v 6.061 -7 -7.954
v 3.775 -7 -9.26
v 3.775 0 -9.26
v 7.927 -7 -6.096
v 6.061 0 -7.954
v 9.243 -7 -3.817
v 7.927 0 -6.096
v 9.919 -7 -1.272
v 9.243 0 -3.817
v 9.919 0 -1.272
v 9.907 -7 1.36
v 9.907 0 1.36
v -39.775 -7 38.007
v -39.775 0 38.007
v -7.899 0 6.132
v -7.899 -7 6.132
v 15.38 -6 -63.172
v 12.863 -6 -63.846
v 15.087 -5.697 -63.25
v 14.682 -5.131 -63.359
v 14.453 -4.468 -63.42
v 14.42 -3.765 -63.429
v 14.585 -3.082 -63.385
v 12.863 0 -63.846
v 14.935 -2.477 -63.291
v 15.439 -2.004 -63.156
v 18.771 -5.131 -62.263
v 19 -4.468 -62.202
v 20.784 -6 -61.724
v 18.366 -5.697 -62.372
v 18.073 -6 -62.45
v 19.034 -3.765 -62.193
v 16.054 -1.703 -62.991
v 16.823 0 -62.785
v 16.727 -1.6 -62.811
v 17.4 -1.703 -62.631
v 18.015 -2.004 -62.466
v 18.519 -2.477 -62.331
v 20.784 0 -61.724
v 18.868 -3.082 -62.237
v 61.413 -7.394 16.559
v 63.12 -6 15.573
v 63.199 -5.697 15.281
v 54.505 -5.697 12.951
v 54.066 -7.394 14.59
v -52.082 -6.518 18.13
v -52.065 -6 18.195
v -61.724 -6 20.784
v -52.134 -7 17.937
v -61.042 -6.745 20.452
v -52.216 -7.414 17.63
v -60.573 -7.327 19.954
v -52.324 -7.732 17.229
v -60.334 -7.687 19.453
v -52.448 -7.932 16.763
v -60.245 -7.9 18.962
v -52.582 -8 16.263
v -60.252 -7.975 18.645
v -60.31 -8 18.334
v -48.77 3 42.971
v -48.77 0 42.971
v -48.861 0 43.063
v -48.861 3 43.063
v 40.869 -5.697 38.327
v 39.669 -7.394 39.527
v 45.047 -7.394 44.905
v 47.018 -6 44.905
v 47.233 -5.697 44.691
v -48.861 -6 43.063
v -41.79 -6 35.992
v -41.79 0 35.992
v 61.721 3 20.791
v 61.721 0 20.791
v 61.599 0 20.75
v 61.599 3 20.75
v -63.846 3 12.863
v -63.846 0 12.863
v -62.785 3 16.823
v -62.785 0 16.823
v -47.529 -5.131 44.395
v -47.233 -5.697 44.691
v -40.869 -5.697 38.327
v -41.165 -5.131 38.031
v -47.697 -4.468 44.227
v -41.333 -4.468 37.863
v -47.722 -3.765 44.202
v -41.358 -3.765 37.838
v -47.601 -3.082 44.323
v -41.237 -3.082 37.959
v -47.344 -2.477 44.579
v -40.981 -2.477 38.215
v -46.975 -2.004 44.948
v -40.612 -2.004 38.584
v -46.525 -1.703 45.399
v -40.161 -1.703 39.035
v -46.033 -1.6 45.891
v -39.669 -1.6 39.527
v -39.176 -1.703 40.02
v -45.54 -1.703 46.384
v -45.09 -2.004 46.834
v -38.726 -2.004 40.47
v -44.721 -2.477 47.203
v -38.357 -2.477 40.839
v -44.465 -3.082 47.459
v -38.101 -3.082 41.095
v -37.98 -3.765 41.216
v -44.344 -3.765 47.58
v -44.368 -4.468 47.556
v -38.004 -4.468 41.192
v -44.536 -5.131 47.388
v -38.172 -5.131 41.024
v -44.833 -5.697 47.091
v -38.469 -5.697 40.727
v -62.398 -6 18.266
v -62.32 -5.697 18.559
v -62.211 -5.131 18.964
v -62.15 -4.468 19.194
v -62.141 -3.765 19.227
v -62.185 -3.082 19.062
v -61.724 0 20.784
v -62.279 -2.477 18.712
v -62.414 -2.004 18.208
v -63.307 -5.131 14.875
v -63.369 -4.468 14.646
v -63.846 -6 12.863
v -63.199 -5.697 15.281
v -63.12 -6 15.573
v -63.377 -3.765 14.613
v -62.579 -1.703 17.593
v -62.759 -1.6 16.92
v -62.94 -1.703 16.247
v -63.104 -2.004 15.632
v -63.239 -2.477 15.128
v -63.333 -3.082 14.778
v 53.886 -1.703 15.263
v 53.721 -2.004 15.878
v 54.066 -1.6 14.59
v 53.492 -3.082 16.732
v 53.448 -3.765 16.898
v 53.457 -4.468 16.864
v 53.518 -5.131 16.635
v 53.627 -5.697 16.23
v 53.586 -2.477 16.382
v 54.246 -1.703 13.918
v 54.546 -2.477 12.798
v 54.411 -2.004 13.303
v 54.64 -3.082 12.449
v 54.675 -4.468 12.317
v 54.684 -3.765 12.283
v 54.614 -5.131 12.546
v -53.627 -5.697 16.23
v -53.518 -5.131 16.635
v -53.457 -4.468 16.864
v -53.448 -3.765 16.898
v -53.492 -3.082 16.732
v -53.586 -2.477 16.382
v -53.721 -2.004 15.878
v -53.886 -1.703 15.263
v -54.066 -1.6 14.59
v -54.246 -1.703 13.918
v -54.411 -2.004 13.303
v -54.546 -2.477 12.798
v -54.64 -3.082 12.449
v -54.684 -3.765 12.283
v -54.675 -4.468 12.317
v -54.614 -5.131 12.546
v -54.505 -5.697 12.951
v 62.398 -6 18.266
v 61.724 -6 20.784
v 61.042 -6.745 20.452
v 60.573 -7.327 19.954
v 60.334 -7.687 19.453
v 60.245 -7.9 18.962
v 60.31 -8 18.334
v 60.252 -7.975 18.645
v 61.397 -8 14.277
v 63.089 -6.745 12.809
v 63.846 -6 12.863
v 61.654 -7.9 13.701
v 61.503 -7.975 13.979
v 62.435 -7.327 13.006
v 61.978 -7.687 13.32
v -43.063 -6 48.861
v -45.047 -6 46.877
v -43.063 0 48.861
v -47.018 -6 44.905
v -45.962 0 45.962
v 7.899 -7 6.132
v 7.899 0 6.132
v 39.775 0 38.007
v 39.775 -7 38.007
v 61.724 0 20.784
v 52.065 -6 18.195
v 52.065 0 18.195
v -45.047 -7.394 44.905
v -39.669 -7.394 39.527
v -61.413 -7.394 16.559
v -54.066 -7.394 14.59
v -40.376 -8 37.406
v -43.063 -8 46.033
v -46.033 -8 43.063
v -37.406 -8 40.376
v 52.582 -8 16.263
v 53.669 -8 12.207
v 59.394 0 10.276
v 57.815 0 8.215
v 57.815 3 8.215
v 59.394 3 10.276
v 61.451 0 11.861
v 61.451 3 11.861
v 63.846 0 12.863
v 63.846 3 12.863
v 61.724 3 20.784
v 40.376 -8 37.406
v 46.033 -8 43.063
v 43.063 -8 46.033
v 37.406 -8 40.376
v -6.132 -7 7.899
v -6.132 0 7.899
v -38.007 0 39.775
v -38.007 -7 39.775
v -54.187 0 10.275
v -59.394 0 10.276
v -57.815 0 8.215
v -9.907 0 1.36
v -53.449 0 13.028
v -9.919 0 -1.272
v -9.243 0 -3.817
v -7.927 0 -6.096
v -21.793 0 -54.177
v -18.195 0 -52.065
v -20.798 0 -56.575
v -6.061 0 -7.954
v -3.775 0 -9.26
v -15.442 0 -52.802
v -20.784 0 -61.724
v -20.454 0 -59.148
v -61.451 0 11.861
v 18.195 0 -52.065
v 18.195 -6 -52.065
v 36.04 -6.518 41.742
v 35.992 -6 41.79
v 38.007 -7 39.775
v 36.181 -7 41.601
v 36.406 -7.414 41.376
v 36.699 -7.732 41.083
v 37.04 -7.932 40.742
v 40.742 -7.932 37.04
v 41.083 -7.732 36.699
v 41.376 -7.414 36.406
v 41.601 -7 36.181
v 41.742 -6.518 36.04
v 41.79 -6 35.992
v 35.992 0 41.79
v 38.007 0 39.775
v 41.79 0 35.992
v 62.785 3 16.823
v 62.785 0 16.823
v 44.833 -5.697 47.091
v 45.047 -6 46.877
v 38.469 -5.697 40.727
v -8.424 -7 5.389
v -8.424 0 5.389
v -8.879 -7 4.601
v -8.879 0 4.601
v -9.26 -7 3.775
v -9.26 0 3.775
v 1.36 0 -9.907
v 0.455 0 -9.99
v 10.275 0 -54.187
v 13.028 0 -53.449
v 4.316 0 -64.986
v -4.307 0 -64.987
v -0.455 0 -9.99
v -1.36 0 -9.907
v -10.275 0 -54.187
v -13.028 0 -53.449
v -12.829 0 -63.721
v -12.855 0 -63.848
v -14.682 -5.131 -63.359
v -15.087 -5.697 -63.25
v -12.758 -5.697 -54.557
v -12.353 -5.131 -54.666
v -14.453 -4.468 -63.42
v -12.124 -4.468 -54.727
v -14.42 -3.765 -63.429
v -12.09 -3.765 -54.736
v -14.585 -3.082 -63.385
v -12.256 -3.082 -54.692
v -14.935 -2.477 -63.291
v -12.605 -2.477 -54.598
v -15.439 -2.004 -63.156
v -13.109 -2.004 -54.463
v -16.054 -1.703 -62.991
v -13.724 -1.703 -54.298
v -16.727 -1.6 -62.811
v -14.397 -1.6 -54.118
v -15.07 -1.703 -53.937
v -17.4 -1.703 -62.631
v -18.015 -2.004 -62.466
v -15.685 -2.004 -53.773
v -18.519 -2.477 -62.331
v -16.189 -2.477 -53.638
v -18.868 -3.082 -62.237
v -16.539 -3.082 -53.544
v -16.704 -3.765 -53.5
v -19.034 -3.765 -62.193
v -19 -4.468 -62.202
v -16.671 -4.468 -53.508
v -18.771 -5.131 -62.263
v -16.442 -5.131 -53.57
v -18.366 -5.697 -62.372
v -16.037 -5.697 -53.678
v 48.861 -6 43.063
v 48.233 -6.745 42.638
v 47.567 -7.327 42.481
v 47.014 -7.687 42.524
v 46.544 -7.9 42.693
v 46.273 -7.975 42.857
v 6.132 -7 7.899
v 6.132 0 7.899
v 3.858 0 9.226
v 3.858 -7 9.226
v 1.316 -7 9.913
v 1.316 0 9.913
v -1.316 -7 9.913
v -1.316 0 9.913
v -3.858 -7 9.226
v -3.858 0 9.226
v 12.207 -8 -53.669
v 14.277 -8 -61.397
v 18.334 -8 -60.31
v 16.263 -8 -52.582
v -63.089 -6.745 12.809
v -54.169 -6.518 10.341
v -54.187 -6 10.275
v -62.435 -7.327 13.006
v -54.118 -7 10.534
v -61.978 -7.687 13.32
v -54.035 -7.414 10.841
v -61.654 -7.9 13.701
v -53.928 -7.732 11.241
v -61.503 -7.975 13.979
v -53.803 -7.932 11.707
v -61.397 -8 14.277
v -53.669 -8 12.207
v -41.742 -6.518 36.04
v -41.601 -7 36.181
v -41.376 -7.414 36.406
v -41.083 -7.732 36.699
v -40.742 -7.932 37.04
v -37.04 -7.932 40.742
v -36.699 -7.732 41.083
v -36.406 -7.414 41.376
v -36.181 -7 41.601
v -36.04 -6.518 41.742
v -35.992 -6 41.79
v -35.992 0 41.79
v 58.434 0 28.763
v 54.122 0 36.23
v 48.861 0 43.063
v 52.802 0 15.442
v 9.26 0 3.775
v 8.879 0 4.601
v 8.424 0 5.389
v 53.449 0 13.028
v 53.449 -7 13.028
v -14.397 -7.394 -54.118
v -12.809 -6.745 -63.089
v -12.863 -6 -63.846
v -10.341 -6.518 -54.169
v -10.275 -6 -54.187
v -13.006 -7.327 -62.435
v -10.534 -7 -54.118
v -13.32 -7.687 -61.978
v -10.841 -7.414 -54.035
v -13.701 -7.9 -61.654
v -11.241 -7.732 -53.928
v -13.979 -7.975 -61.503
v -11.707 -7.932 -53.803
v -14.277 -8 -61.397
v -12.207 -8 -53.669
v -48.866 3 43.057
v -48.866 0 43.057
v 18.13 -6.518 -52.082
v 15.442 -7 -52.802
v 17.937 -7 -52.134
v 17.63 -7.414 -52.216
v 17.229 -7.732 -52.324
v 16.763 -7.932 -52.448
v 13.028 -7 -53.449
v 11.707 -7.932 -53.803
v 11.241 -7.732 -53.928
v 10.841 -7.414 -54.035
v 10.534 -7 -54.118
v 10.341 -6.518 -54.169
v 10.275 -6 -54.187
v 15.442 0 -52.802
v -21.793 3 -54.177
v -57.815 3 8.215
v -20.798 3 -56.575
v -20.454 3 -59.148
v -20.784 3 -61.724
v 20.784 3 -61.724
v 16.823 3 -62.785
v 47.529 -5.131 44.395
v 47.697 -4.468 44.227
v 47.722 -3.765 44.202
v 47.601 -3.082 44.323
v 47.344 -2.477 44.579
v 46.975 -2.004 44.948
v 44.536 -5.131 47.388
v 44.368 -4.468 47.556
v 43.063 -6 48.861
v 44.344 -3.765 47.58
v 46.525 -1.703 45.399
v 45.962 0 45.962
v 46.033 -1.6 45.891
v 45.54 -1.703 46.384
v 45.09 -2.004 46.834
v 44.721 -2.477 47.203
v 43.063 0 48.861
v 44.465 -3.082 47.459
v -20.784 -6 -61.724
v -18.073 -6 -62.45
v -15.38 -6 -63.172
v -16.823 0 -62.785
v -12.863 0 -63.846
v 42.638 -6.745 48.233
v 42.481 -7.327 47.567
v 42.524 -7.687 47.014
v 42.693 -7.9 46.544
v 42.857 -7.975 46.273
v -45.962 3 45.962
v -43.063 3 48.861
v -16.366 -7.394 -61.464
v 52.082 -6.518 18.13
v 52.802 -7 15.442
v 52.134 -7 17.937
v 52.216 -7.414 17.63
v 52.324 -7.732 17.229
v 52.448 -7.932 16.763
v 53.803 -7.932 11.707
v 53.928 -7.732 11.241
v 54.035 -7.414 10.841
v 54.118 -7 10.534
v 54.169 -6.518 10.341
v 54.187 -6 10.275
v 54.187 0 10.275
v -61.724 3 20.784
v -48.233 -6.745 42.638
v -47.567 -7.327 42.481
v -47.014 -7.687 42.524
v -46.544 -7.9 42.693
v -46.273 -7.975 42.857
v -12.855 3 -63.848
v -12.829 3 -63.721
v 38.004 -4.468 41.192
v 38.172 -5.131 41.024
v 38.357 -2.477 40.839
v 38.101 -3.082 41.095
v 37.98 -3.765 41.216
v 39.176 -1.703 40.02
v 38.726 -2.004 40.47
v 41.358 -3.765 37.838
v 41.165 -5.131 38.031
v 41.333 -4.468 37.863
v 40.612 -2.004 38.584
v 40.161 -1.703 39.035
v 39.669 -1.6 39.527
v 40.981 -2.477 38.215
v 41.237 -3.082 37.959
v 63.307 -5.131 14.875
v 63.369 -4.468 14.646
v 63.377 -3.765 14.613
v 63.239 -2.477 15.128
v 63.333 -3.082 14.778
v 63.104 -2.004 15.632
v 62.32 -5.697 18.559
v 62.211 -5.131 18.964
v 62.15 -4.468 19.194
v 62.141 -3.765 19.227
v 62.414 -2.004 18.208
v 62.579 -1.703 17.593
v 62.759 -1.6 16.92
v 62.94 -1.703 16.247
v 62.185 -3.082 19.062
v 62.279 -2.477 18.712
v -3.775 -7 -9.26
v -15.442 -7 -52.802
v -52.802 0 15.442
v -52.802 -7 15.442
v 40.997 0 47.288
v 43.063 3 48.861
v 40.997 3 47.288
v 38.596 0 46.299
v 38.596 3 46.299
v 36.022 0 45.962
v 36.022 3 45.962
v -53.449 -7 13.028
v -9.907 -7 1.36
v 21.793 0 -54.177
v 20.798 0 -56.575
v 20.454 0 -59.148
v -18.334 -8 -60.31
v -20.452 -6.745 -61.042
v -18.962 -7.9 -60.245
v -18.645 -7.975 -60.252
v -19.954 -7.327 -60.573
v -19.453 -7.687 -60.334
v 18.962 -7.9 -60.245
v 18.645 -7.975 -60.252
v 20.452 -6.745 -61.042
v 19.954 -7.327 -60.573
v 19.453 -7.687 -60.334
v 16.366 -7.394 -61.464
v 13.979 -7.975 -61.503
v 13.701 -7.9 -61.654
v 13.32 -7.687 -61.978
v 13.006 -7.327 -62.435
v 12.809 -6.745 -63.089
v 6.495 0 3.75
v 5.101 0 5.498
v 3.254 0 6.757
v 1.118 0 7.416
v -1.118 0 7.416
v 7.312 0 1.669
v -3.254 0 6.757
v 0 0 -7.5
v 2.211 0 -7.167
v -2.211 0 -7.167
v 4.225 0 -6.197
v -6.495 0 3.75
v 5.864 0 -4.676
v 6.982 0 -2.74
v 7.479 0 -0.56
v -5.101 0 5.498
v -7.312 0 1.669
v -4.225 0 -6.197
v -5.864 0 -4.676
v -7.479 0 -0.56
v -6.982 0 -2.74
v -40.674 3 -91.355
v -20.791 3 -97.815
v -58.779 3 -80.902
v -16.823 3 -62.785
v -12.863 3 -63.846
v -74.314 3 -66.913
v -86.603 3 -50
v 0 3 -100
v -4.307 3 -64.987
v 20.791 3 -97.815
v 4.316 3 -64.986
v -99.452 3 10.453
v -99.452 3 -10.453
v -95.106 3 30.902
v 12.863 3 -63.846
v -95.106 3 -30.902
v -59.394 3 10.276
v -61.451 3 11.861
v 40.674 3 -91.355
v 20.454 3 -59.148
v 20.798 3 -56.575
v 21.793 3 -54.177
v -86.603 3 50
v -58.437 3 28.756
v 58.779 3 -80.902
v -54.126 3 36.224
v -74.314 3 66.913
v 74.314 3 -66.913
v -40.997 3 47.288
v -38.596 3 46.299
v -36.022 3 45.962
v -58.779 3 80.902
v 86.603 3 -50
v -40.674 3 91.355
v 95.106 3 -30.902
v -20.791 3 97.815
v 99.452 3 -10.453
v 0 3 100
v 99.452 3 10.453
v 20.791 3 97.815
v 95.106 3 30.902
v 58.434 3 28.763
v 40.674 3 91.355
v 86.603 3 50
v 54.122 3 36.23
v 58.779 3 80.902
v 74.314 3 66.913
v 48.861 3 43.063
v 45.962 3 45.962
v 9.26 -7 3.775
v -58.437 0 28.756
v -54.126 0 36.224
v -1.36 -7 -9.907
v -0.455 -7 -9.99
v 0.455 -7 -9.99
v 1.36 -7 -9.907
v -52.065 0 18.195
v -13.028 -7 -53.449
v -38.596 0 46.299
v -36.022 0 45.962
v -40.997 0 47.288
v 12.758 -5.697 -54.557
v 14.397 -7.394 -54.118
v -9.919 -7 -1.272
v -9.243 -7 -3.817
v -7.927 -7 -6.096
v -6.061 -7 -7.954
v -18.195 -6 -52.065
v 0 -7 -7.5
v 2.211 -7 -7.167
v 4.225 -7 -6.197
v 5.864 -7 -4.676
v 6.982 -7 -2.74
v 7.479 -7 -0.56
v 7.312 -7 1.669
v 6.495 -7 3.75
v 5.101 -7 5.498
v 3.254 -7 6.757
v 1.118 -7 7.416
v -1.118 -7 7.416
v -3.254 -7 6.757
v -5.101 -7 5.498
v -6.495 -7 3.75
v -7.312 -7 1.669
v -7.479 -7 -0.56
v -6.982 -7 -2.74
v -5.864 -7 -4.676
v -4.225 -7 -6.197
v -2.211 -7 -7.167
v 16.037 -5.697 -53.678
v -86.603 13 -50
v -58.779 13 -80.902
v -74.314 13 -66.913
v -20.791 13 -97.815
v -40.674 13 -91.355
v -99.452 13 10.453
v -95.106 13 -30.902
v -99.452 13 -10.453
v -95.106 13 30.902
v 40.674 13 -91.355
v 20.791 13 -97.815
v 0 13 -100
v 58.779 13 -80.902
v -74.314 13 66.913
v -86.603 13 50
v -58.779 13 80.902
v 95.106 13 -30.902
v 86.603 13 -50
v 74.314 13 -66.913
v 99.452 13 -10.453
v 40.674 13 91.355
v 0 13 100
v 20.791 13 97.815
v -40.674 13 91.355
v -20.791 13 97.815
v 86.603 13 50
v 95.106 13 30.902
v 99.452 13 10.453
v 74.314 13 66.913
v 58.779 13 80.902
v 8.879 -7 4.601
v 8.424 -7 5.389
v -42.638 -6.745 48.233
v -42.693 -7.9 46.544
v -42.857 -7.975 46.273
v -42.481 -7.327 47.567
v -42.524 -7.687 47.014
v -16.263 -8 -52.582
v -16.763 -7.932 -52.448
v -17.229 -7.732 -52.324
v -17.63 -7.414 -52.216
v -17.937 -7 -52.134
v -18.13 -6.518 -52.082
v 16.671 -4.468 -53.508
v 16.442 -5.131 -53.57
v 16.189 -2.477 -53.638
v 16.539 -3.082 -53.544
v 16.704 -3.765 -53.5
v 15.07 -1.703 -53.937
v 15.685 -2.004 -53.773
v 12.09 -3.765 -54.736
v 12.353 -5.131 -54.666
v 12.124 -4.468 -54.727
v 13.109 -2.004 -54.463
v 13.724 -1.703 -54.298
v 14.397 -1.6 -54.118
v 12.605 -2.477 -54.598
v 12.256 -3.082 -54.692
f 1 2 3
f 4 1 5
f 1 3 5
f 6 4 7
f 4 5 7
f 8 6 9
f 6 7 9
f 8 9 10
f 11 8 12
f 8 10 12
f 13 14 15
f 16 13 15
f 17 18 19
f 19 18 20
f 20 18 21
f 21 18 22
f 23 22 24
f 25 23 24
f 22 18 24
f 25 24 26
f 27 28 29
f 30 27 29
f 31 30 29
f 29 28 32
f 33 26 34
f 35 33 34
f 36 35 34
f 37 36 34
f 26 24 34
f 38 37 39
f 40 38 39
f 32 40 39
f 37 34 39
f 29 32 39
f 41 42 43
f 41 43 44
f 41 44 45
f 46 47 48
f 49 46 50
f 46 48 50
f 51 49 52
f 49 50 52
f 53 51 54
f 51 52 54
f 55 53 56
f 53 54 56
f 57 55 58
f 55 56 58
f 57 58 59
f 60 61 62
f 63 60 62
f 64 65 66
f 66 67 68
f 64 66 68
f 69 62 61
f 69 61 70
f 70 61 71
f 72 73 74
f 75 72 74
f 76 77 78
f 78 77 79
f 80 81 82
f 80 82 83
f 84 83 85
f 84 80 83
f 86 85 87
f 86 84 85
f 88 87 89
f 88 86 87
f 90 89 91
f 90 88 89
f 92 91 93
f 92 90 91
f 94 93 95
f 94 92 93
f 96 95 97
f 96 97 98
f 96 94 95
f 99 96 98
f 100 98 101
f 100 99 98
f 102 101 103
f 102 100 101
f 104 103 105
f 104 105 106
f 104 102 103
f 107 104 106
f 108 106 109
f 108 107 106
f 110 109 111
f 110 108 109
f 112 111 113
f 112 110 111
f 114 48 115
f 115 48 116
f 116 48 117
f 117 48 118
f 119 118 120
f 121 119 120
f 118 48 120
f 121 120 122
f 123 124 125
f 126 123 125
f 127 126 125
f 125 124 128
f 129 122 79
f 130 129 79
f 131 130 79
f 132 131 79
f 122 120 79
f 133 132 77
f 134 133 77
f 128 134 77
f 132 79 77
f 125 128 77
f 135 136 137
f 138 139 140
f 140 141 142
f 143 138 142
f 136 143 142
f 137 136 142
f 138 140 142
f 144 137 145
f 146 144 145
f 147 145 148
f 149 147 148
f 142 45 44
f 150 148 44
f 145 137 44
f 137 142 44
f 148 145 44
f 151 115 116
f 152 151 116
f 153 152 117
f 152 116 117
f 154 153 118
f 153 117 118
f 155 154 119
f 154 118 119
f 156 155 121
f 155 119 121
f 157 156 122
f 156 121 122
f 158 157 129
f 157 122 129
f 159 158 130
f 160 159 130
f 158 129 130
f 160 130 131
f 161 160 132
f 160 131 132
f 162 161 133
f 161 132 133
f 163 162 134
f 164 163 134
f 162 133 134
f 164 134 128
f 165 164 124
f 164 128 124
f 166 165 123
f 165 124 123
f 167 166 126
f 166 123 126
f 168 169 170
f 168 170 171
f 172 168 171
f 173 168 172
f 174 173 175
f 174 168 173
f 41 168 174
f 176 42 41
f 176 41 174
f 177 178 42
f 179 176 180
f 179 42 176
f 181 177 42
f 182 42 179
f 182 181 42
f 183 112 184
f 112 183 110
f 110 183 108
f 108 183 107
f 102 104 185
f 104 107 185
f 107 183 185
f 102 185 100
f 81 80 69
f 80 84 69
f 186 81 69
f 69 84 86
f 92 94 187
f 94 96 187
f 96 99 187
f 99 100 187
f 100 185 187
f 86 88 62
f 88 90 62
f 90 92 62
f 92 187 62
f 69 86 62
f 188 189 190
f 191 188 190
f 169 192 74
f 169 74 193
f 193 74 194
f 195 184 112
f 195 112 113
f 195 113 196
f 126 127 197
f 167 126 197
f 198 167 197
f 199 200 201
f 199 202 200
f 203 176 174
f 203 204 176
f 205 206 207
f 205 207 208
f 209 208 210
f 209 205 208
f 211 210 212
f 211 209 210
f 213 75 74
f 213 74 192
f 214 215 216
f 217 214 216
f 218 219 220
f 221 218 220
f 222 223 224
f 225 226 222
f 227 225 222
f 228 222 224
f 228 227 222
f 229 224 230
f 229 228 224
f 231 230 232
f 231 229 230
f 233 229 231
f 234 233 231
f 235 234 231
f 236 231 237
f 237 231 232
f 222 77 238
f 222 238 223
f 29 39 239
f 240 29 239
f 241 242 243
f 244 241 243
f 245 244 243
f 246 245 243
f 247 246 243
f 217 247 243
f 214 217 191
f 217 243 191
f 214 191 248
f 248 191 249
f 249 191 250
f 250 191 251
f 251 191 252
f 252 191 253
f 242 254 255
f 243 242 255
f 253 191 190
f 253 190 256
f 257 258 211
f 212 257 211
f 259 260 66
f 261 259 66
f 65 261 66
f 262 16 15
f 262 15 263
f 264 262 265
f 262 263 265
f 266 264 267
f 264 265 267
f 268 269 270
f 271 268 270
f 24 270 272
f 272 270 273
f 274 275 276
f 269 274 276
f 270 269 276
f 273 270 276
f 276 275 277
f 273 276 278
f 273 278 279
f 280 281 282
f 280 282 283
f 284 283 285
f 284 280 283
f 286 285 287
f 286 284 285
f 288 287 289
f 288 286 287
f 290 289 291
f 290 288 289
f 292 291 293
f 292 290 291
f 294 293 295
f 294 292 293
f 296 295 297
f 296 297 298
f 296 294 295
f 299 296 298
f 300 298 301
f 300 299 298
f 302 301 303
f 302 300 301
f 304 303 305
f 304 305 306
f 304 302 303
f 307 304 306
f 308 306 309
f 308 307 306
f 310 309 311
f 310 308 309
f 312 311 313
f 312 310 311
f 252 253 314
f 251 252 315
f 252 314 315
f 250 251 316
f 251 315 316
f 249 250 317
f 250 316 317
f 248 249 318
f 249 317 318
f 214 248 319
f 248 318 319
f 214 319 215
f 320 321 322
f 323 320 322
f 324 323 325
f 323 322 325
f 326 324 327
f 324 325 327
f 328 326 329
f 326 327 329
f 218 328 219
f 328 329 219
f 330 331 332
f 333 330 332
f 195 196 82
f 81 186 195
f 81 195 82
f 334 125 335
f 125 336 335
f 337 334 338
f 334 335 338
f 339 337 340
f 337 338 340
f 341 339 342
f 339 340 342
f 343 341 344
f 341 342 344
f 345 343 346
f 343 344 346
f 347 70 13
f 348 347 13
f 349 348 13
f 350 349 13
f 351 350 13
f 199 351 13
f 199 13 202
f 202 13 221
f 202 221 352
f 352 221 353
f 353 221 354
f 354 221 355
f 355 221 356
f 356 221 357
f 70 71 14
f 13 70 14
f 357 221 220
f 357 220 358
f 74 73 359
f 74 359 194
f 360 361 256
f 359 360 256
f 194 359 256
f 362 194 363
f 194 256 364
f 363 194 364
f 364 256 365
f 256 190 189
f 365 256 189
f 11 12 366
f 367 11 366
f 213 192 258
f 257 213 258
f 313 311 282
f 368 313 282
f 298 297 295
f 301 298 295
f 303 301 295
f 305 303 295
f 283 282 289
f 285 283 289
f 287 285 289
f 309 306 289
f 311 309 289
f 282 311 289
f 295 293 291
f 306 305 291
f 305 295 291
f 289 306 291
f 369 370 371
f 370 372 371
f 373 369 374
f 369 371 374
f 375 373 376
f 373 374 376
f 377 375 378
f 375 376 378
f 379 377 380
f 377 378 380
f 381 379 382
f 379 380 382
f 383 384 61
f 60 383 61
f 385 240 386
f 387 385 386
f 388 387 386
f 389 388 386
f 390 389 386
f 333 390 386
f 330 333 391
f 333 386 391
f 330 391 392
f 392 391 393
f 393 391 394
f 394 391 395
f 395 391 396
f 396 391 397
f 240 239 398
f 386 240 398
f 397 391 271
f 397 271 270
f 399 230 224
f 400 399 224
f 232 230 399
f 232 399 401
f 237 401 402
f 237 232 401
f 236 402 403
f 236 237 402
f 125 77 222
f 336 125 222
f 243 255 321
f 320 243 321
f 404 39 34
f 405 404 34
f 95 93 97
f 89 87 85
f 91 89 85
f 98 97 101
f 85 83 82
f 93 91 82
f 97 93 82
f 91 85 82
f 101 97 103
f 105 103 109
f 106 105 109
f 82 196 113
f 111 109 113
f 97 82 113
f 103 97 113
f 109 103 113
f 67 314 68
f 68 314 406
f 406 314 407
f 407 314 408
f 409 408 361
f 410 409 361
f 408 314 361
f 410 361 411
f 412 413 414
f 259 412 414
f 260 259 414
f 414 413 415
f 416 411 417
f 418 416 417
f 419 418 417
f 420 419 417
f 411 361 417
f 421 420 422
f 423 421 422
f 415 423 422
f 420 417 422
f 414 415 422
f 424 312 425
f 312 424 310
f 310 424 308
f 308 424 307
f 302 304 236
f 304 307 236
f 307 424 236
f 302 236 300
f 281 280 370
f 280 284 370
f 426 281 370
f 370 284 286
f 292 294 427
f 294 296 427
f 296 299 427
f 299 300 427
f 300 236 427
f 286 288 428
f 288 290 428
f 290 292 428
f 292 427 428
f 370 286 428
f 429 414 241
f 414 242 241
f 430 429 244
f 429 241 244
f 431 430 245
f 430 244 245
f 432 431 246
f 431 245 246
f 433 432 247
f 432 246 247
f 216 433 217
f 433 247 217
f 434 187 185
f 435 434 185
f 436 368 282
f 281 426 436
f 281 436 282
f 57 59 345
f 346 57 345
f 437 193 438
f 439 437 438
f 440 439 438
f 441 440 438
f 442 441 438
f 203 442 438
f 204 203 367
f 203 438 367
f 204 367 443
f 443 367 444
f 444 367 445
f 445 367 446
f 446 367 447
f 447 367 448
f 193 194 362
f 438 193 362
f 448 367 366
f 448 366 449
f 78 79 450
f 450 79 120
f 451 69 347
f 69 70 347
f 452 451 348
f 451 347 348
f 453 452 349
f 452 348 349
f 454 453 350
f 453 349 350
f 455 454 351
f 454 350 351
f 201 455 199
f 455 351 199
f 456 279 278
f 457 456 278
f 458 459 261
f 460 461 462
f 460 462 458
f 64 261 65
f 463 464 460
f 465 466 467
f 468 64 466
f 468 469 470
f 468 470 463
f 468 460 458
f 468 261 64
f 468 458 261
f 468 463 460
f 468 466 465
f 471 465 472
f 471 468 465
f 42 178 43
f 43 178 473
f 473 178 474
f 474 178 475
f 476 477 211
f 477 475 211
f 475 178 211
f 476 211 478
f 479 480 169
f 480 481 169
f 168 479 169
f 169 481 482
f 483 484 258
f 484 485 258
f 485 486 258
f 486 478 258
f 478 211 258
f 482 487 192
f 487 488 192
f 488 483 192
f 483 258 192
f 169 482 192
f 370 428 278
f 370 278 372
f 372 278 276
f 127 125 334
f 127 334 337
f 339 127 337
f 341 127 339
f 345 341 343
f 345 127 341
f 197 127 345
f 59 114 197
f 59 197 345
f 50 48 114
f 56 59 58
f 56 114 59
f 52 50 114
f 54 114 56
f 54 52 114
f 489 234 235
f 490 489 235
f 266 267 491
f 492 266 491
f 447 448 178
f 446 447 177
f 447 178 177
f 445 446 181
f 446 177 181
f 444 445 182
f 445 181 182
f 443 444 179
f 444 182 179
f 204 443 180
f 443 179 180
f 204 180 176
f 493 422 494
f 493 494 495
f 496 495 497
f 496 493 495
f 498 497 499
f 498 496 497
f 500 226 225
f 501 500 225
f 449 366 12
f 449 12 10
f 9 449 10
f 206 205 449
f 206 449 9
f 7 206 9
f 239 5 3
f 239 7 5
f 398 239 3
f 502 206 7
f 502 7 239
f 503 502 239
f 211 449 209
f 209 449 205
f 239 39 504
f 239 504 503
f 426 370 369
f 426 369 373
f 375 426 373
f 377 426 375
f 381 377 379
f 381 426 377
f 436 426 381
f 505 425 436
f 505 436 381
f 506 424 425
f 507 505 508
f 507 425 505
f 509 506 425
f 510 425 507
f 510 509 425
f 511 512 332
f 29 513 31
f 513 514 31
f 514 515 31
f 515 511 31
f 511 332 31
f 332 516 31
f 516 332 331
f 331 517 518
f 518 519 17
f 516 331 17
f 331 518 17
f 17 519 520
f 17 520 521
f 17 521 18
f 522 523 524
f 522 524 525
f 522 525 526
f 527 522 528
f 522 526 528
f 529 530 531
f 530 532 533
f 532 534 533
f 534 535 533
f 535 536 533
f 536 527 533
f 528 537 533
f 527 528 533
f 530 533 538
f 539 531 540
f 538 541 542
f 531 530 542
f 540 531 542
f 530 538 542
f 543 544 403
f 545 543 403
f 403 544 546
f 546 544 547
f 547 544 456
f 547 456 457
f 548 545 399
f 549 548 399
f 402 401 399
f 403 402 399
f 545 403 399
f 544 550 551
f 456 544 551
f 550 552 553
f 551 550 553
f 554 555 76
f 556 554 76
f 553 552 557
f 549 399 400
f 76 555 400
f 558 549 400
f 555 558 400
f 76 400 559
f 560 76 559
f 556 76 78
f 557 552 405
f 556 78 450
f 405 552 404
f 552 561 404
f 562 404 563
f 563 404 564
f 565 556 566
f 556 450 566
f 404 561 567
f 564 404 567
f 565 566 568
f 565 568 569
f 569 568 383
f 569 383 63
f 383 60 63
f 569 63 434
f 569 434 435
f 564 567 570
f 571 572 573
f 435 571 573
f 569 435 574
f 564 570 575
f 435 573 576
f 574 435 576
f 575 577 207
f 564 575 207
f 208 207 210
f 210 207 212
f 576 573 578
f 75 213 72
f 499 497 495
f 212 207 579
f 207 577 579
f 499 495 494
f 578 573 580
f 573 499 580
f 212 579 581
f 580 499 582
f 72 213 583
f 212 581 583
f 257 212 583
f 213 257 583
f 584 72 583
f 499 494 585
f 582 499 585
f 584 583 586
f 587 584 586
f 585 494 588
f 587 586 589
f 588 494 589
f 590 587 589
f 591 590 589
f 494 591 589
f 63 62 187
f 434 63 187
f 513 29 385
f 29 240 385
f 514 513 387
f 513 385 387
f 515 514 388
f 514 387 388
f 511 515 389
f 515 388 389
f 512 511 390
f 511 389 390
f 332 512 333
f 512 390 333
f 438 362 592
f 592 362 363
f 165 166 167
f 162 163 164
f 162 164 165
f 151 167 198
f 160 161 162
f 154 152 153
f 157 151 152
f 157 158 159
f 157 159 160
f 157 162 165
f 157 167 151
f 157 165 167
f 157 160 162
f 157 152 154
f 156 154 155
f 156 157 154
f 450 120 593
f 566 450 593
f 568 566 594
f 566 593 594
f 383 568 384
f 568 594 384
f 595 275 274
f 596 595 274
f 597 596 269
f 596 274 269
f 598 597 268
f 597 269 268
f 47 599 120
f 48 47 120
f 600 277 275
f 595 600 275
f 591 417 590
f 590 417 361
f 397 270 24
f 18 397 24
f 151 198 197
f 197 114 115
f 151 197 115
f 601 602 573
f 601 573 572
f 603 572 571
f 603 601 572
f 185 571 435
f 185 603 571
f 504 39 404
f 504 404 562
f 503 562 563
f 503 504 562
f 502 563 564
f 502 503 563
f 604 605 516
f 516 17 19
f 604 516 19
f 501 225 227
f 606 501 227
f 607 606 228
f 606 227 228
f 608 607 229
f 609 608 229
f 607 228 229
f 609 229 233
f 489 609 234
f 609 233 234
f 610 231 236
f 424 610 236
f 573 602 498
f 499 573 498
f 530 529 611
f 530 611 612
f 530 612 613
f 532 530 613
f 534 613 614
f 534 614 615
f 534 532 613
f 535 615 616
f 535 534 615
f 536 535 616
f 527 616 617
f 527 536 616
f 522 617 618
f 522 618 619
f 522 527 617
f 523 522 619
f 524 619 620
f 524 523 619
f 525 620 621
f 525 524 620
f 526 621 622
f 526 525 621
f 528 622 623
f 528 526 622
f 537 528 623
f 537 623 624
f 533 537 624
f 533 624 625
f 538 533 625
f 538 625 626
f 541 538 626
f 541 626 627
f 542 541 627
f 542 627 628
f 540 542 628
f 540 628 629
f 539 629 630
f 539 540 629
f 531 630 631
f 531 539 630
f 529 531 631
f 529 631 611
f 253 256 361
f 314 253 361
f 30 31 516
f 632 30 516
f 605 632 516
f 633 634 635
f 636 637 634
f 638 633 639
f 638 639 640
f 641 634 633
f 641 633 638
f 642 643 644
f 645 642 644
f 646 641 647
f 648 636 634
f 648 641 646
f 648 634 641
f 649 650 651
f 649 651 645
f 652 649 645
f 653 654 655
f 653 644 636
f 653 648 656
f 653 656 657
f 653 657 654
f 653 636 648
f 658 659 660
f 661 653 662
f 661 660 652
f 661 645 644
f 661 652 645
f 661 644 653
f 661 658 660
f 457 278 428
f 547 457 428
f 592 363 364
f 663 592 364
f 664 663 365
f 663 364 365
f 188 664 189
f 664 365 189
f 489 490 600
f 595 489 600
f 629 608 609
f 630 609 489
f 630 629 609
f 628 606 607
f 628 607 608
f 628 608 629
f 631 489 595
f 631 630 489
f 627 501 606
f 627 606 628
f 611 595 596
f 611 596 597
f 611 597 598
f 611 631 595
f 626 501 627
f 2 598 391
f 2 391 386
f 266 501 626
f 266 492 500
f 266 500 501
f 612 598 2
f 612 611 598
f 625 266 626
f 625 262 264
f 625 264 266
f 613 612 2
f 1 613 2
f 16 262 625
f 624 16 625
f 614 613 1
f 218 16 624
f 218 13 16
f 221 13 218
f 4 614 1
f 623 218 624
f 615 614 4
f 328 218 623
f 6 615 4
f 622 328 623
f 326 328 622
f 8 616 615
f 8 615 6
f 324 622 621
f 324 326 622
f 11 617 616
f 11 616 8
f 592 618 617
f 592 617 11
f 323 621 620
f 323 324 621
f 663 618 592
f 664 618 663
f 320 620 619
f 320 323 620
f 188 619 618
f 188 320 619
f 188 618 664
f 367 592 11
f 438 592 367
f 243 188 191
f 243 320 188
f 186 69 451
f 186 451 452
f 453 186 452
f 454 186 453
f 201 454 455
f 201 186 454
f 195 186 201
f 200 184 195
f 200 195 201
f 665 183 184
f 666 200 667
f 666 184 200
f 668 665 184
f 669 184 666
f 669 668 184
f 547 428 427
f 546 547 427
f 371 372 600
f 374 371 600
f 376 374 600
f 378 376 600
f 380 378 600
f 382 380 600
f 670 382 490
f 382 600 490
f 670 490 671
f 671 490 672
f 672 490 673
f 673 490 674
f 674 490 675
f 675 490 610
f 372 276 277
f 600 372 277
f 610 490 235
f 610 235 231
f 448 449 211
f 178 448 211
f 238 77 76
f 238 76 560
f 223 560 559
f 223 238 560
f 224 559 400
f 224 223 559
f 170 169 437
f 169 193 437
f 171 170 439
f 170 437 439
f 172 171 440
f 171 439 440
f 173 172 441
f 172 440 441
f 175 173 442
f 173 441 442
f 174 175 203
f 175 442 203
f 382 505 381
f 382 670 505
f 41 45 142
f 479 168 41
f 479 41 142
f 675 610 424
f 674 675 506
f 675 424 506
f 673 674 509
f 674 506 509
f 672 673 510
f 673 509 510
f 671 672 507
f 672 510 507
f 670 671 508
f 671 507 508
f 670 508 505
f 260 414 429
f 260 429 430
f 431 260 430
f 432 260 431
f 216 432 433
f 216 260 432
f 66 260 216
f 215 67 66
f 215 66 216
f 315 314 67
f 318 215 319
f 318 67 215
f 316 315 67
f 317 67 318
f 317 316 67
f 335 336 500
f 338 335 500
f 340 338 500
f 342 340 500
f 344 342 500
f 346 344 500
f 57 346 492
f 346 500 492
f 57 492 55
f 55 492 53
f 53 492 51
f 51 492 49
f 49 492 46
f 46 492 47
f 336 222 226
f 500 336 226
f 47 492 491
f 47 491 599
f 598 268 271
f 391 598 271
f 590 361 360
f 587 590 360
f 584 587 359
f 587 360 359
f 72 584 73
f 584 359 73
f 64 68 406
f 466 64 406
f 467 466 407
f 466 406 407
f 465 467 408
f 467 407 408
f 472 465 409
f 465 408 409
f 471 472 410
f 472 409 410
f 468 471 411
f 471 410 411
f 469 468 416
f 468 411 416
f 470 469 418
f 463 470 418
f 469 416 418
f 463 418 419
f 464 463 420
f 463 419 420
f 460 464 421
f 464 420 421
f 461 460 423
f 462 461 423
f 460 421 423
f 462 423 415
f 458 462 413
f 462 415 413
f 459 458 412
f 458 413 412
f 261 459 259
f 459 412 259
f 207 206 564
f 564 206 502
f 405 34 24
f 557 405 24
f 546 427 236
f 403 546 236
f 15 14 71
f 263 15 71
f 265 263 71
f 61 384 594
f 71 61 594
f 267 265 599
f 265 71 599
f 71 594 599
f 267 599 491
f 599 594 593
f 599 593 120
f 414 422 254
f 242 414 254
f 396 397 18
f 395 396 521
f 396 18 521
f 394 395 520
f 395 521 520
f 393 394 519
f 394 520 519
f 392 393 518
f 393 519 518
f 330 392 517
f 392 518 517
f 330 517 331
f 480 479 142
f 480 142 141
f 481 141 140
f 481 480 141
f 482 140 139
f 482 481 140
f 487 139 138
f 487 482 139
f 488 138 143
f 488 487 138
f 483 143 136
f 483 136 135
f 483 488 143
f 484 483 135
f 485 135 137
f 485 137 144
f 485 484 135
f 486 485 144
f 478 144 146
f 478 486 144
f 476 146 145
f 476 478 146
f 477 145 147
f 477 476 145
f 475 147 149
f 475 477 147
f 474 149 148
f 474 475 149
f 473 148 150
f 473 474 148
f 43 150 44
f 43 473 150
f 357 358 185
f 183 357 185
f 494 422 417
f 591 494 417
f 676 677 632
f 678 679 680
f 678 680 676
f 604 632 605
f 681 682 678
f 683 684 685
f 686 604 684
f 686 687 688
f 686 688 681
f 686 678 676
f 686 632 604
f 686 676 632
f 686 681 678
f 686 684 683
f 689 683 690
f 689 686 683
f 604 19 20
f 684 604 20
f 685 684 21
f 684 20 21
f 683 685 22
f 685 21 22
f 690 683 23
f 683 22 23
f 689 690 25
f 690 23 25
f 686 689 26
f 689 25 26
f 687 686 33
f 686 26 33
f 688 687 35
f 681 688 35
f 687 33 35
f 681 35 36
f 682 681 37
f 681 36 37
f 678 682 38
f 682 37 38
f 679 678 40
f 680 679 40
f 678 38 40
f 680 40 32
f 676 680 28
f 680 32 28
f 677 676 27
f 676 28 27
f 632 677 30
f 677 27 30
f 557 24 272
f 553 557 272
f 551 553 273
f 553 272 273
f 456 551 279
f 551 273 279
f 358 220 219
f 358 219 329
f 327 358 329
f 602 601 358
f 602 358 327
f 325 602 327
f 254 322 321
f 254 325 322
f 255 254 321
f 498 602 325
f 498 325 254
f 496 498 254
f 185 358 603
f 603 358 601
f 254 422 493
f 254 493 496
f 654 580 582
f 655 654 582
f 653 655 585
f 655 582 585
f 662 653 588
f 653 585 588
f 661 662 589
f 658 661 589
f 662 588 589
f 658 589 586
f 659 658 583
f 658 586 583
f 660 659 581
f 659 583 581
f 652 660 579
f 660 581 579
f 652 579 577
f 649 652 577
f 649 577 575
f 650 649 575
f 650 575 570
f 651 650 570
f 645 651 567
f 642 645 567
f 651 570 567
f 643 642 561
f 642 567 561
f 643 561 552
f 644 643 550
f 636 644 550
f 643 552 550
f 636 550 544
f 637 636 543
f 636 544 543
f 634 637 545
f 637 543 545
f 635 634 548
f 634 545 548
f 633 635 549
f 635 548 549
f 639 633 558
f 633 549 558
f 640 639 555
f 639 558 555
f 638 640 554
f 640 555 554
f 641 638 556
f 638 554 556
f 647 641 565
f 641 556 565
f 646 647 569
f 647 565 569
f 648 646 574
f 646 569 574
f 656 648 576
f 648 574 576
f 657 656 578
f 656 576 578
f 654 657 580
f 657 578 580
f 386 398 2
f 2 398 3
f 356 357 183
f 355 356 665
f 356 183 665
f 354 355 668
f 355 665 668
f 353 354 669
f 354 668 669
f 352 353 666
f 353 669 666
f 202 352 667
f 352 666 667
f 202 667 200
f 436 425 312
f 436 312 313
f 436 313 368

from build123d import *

# Parameters (mm, degrees)
EXTRUDE_1_DEPTH                      = 3
EXTRUDE_3_DEPTH                      = 8
CUT_EXTRUDE_3_DEPTH                  = 9
EXTRUDE_4_DEPTH                      = 3
EXTRUDE_START                        = -3
EXTRUDE_5_DEPTH                      = 3
CHAMFER_1_SIZE                       = 2
FILLET_1_R                           = 2
PATTERN_CIRCULAR_3_COUNT             = 3
PATTERN_CIRCULAR_3_COPY_1_DEPTH      = 9
PATTERN_CIRCULAR_3_COPY_2_DEPTH      = 9
CHAMFER_1_OF_PATTERN_CIRCULAR_3_SIZE = 2
FILLET_1_OF_PATTERN_CIRCULAR_3_R     = 2
SKETCH_8_R                           = 10
SKETCH_8_R_2                         = 7.5
EXTRUDE_6_DEPTH                      = 7
FILLET_2_R                           = 10
SKETCH_11_R                          = 100
EXTRUDE_7_DEPTH                      = 10


with BuildPart() as part:
    # 草圖1 → 填料-伸長1 (new body)
    with BuildSketch(Plane(origin=(0, 0, 0), x_dir=(1, 0, 0), z_dir=(0, 1, 0))):
        Polygon((0, 0), (-16.823237932, 62.785178709), (-62.785178709, -16.823237932), align=None)
        with BuildLine():
            Line((0, 65), (0, 0))
            Line((0, 0), (16.823237932, 62.785178709))
            ThreePointArc((16.823237932, 62.785178709), (8.484202494, 64.443915989), (0, 65))
        make_face()
        with BuildLine():
            Line((-16.823237932, 62.785178709), (0, 0))
            Line((0, 0), (0, 65))
            ThreePointArc((0, 65), (-8.484202494, 64.443915989), (-16.823237932, 62.785178709))
        make_face()
        Polygon((0, 0), (62.785178709, -16.823237932), (16.823237932, 62.785178709), align=None)
        with BuildLine():
            Line((0, 0), (45.961940777, -45.961940777))
            ThreePointArc((45.961940777, -45.961940777), (56.291651246, -32.5), (62.785178709, -16.823237932))
            Line((62.785178709, -16.823237932), (0, 0))
        make_face()
        Polygon((0, 0), (0, -45.961940777), (45.961940777, -45.961940777), align=None)
        Polygon((-45.961940777, -45.961940777), (0, -45.961940777), (0, 0), align=None)
        with BuildLine():
            Line((0, 0), (-62.785178709, -16.823237932))
            ThreePointArc((-62.785178709, -16.823237932), (-56.291651246, -32.5), (-45.961940777, -45.961940777))
            Line((-45.961940777, -45.961940777), (0, 0))
        make_face()
    extrude(amount=EXTRUDE_1_DEPTH)

    # 草圖2 → 填料-伸長3 (add)
    with BuildSketch(Plane.XZ):
        Polygon((12.862942044, -63.846336794), (20.783533819, -61.724020624), (18.195343368, -52.064762361), (10.274751593, -54.187078531), align=None)
        Polygon((-10.274751593, -54.187078531), (-18.195343368, -52.064762361), (-20.783533819, -61.724020624), (-12.862942044, -63.846336794), align=None)
    extrude_3 = extrude(amount=EXTRUDE_3_DEPTH)

    # 草圖5 → 除料-伸長3 (cut)
    with BuildSketch(Plane(origin=(16.823237932, 0, -62.785178709), x_dir=(-0.9659258262890813, 0, -0.2588190451024721), z_dir=(0.2588190451024721, 0, -0.9659258262890813))):
        with BuildLine():
            Line((0.1, -7.39411255), (1.797056275, -5.697056275))
            ThreePointArc((1.797056275, -5.697056275), (0.1, -1.6), (-1.597056275, -5.697056275))
            Line((-1.597056275, -5.697056275), (0.1, -7.39411255))
        make_face()
    cut_extrude_3 = extrude(amount=-CUT_EXTRUDE_3_DEPTH, mode=Mode.SUBTRACT)

    # 鏡射1: 除料-伸長3 across plane
    add(cut_extrude_3.mirror(Plane(origin=(0, 0, 0), x_dir=(0, 0, 1), z_dir=(1, 0, 0))), mode=Mode.SUBTRACT)

    # 草圖6 → 填料-伸長4 (add)
    with BuildSketch(Plane(origin=(0, 0, 0), x_dir=(1, 0, 0), z_dir=(0, 1, 0))):
        with BuildLine():
            ThreePointArc((12.829441395, 63.72131067), (14.83372622, 63.284757773), (16.823237932, 62.785178709))
            Line((16.823237932, 62.785178709), (12.862942044, 63.846336794))
            Line((12.862942044, 63.846336794), (12.829441395, 63.72131067))
        make_face()
        Polygon((20.783533819, 61.724020624), (16.823237932, 62.785178709), (19.722375735, 57.763724736), align=None)
        with BuildLine():
            Line((-12.829441395, 63.72131067), (-12.862942044, 63.846336794))
            Line((-12.862942044, 63.846336794), (-16.823237932, 62.785178709))
            ThreePointArc((-16.823237932, 62.785178709), (-14.83372622, 63.284757773), (-12.829441395, 63.72131067))
        make_face()
        Polygon((-19.722375735, 57.763724736), (-16.823237932, 62.785178709), (-20.783533819, 61.724020624), align=None)
    extrude_4 = extrude(amount=EXTRUDE_4_DEPTH)

    # 草圖7 → 填料-伸長5 (add)
    with BuildSketch(Plane(origin=(0, 3, 0), x_dir=(1, 0, 0), z_dir=(0, 1, 0)).offset(EXTRUDE_START)):
        with BuildLine():
            Line((12.829441395, 63.72131067), (12.862942044, 63.846336794))
            ThreePointArc((12.862942044, 63.846336794), (0.00408223, 65.129179201), (-12.854938297, 63.847948764))
            Line((-12.854938297, 63.847948764), (-12.829441395, 63.72131067))
            ThreePointArc((-12.829441395, 63.72131067), (0, 65), (12.829441395, 63.72131067))
        make_face()
    extrude_5 = extrude(amount=EXTRUDE_5_DEPTH)

    # 導角1
    # the kernel refuses this chamfer: 2 mm, written as the material it takes off along each edge
    with BuildSketch(Plane(origin=(7.894832014, -8, -65.177537864), x_dir=(-0.2587211899984849, -0.027495876610586514, 0.9655606260692197), z_dir=(0.9659258262890813, 0, 0.2588190451024725))) as chamfer_1_piece_1:
        Polygon((CHAMFER_1_SIZE * 0.999621916911, -CHAMFER_1_SIZE * 0.0274958766106), (-CHAMFER_1_SIZE * 0.0274958766106, -CHAMFER_1_SIZE * 0.999621916911), (0, 0), align=None)
    extrude(amount=18.486731952, mode=Mode.SUBTRACT)
    with BuildSketch(Plane(origin=(-25.75164385, -8, -60.392819553), x_dir=(-0.007116456528607307, 0.9996219169112968, -0.0265589773346234), z_dir=(0.9659258262890822, 0, -0.25881904510246906))) as chamfer_1_piece_2:
        Polygon((CHAMFER_1_SIZE * 0.999621916911, CHAMFER_1_SIZE * 0.0274958766106), (-CHAMFER_1_SIZE * 0.0274958766106, CHAMFER_1_SIZE * 0.999621916911), (0, 0), align=None)
    extrude(amount=18.486731952, mode=Mode.SUBTRACT)

    # 圓角1
    fillet_1_edges = [part.edges().sort_by_distance(p)[0] for p in [
        (-19.230619549, -8, -55.928465666),
        (-11.310027773, -8, -58.050781836),
        (11.310027773, -8, -58.050781836),
        (19.230619549, -8, -55.928465666),
    ]]
    fillet(fillet_1_edges, radius=FILLET_1_R)

    # 環狀複製排列3: 填料-伸長3, 除料-伸長3, 填料-伸長4, 填料-伸長5 ×3 about axis
    pattern_circular_3_axis = Axis((0, 0, 0), (0, 1, 0))
    add([extrude_3.rotate(pattern_circular_3_axis, i * 360 / PATTERN_CIRCULAR_3_COUNT) for i in range(1, PATTERN_CIRCULAR_3_COUNT)])
    add([cut_extrude_3.rotate(pattern_circular_3_axis, i * 360 / PATTERN_CIRCULAR_3_COUNT) for i in range(1, PATTERN_CIRCULAR_3_COUNT)], mode=Mode.SUBTRACT)
    add([extrude_4.rotate(pattern_circular_3_axis, i * 360 / PATTERN_CIRCULAR_3_COUNT) for i in range(1, PATTERN_CIRCULAR_3_COUNT)])
    add([extrude_5.rotate(pattern_circular_3_axis, i * 360 / PATTERN_CIRCULAR_3_COUNT) for i in range(1, PATTERN_CIRCULAR_3_COUNT)])

    # 環狀複製排列3 copy 1 sketch → 環狀複製排列3 copy 1 (cut)
    with BuildSketch(Plane(origin=(-45.961940777, 0, 45.961940777), x_dir=(-0.7071067811865117, 0, -0.7071067811865832), z_dir=(-0.7071067811865832, 0, 0.7071067811865117))):
        with BuildLine():
            Line((0.1, 7.39411255), (1.797056275, 5.697056275))
            ThreePointArc((1.797056275, 5.697056275), (0.1, 1.6), (-1.597056275, 5.697056275))
            Line((-1.597056275, 5.697056275), (0.1, 7.39411255))
        make_face()
    extrude(amount=-PATTERN_CIRCULAR_3_COPY_1_DEPTH, mode=Mode.SUBTRACT)

    # 環狀複製排列3 copy 2 sketch → 環狀複製排列3 copy 2 (cut)
    with BuildSketch(Plane(origin=(62.785178709, 0, 16.823237932), x_dir=(-0.2588190451025699, 0, 0.9659258262890551), z_dir=(0.9659258262890551, 0, 0.2588190451025699))):
        with BuildLine():
            Line((0.1, 7.39411255), (1.797056275, 5.697056275))
            ThreePointArc((1.797056275, 5.697056275), (0.1, 1.6), (-1.597056275, 5.697056275))
            Line((-1.597056275, 5.697056275), (0.1, 7.39411255))
        make_face()
    extrude(amount=-PATTERN_CIRCULAR_3_COPY_2_DEPTH, mode=Mode.SUBTRACT)

    # 導角1 of 環狀複製排列3
    # the kernel refuses this chamfer: 2 mm, written as the material it takes off along each edge
    with BuildSketch(Plane(origin=(-60.392819553, -8, 25.75164385), x_dir=(-0.026558977334623094, 0.9996219169112968, 0.007116456528610167), z_dir=(-0.25881904510256887, 0, -0.9659258262890554)), Plane(origin=(-39.425894015, -8, 52.49798754), x_dir=(-0.019442520806014836, 0.9996219169112968, 0.019442520806012744), z_dir=(-0.7071067811865095, 0, -0.7071067811865857)), Plane(origin=(52.49798754, -8, 39.425894015), x_dir=(0.01944252080601648, 0.9996219169112968, 0.01944252080601455), z_dir=(-0.7071067811865125, 0, 0.7071067811865825)), Plane(origin=(65.177537864, -8, 7.894832014), x_dir=(0.026558977334623382, 0.9996219169112965, 0.007116456528610366), z_dir=(-0.258819045102573, 0, 0.9659258262890543))) as chamfer_1_of_pattern_circular_3_piece_1:
        Polygon((CHAMFER_1_OF_PATTERN_CIRCULAR_3_SIZE * 0.999621916911, CHAMFER_1_OF_PATTERN_CIRCULAR_3_SIZE * 0.0274958766106), (-CHAMFER_1_OF_PATTERN_CIRCULAR_3_SIZE * 0.0274958766106, CHAMFER_1_OF_PATTERN_CIRCULAR_3_SIZE * 0.999621916911), (0, 0), align=None)
    extrude(amount=18.486731952, mode=Mode.SUBTRACT)

    # 圓角1 of 環狀複製排列3
    fillet_1_of_pattern_circular_3_edges = [part.edges().sort_by_distance(p)[0] for p in [
        (-38.820162287, -8, 44.618437893),
        (-44.618437893, -8, 38.820162287),
        (-55.928465666, -8, 19.230619549),
        (-58.050781836, -8, 11.310027773),
        (58.050781836, -8, 11.310027773),
        (55.928465666, -8, 19.230619549),
        (44.618437893, -8, 38.820162287),
        (38.820162287, -8, 44.618437893),
    ]]
    fillet(fillet_1_of_pattern_circular_3_edges, radius=FILLET_1_OF_PATTERN_CIRCULAR_3_R)

    # 草圖8 → 填料-伸長6 (add)
    # profile 1 of 7: a face of its own
    with BuildSketch(Plane.XZ):
        with BuildLine():
            Line((-39.774756442, 38.006989489), (-7.899491077, 6.131724124))
            ThreePointArc((-7.899491077, 6.131724124), (-7.071067812, 7.071067812), (-6.131724124, 7.899491077))
            Line((-6.131724124, 7.899491077), (-38.006989489, 39.774756442))
            Line((-38.006989489, 39.774756442), (-39.774756442, 38.006989489))
        make_face()
    # profile 2 of 7: a face of its own
    with BuildSketch(Plane.XZ):
        with BuildLine():
            Line((-53.449444252, 13.027640198), (-9.907022011, 1.360483322))
            ThreePointArc((-9.907022011, 1.360483322), (-9.659258263, 2.588190451), (-9.259974398, 3.775297888))
            Line((-9.259974398, 3.775297888), (-52.80239664, 15.442454763))
            Line((-52.80239664, 15.442454763), (-53.449444252, 13.027640198))
        make_face()
    # profile 3 of 7: a face of its own
    with BuildSketch(Plane.XZ):
        with BuildLine():
            ThreePointArc((6.131724124, 7.899491077), (7.071067812, 7.071067812), (7.899491077, 6.131724124))
            Line((7.899491077, 6.131724124), (39.774756442, 38.006989489))
            Line((39.774756442, 38.006989489), (38.006989489, 39.774756442))
            Line((38.006989489, 39.774756442), (6.131724124, 7.899491077))
        make_face()
    # profile 4 of 7: a face of its own
    with BuildSketch(Plane.XZ):
        with BuildLine():
            ThreePointArc((9.259974398, 3.775297888), (9.659258263, 2.588190451), (9.907022011, 1.360483322))
            Line((9.907022011, 1.360483322), (53.449444252, 13.027640198))
            Line((53.449444252, 13.027640198), (52.80239664, 15.442454764))
            Line((52.80239664, 15.442454764), (9.259974398, 3.775297888))
        make_face()
    # profile 5 of 7: a face of its own
    with BuildSketch(Plane.XZ):
        with BuildLine():
            Line((1.360483322, -9.907022011), (13.027640198, -53.449444252))
            Line((13.027640198, -53.449444252), (15.442454764, -52.80239664))
            Line((15.442454764, -52.80239664), (3.775297888, -9.259974398))
            ThreePointArc((3.775297888, -9.259974398), (2.588190451, -9.659258263), (1.360483322, -9.907022011))
        make_face()
    # profile 6 of 7: a face of its own
    with BuildSketch(Plane.XZ):
        with BuildLine():
            Line((-13.027640198, -53.449444252), (-1.360483322, -9.907022011))
            ThreePointArc((-1.360483322, -9.907022011), (-2.588190451, -9.659258263), (-3.775297888, -9.259974398))
            Line((-3.775297888, -9.259974398), (-15.442454763, -52.80239664))
            Line((-15.442454763, -52.80239664), (-13.027640198, -53.449444252))
        make_face()
    # profile 7 of 7: a face of its own
    with BuildSketch(Plane.XZ):
        Circle(SKETCH_8_R)
        with Locations(Location((0, 0, 0), (0, 0, 270))):
            Circle(SKETCH_8_R_2, mode=Mode.SUBTRACT)
    extrude(amount=EXTRUDE_6_DEPTH)

    # 圓角2
    # the kernel refuses this fillet: 10 mm, written as the material it adds along each edge
    with BuildSketch(Plane(origin=(-59.886040906, 0, 11.801783959), x_dir=(-0.9659258262890541, 0, 0.2588190451025734), z_dir=(0, 1, 0))) as fillet_2_piece_1_section:
        with BuildLine():
            CenterArc((FILLET_2_R * 0.414213562371, -FILLET_2_R), FILLET_2_R, 90, 45)
            Line((-FILLET_2_R * 0.292893218815, -FILLET_2_R * 0.292893218813), (0, 0))
            Line((0, 0), (FILLET_2_R * 0.414213562371, 0))
        make_face()
    fillet_2_piece_1 = extrude(amount=3, mode=Mode.PRIVATE)
    fillet_2_piece_1 = split(fillet_2_piece_1, bisect_by=Plane(origin=(-64.006723661, 1.5, 12.264370105), z_dir=(0.9659258262890554, 0, -0.25881904510256887)), keep=Keep.TOP, mode=Mode.PRIVATE)
    add(fillet_2_piece_1)
    with BuildSketch(Plane(origin=(-40.163665171, 0, 45.961940777), x_dir=(-0.707106781186538, 0, 0.7071067811865569), z_dir=(0, 1, 0))) as fillet_2_piece_2_section:
        with BuildLine():
            CenterArc((FILLET_2_R * 0.414213562373, FILLET_2_R), FILLET_2_R, 225, 45)
            Line((-FILLET_2_R * 0.292893218813, FILLET_2_R * 0.292893218813), (0, 0))
            Line((0, 0), (FILLET_2_R * 0.414213562373, 0))
        make_face()
    fillet_2_piece_2 = extrude(amount=3, mode=Mode.PRIVATE)
    fillet_2_piece_2 = split(fillet_2_piece_2, bisect_by=Plane(origin=(-42.624617903, 1.5, 49.299263651), z_dir=(0.7071067811878319, 0, -0.7071067811852634)), keep=Keep.TOP, mode=Mode.PRIVATE)
    add(fillet_2_piece_2)
    with BuildSketch(Plane(origin=(40.163665171, 0, 45.961940777), x_dir=(-1.0, 0, -1.1304498582404621e-12), z_dir=(0, 1, 0))) as fillet_2_piece_3_section:
        with BuildLine():
            CenterArc((FILLET_2_R * 0.414213562372, FILLET_2_R), FILLET_2_R, 225, 45)
            Line((-FILLET_2_R * 0.292893218814, FILLET_2_R * 0.292893218813), (0, 0))
            Line((0, 0), (FILLET_2_R * 0.414213562373, 0))
        make_face()
    fillet_2_piece_3 = extrude(amount=3, mode=Mode.PRIVATE)
    fillet_2_piece_3 = split(fillet_2_piece_3, bisect_by=Plane(origin=(42.624617903, 1.5, 49.299263651), z_dir=(-0.7071067811865825, 0, -0.7071067811865125)), keep=Keep.TOP, mode=Mode.PRIVATE)
    add(fillet_2_piece_3)
    with BuildSketch(Plane(origin=(59.886040906, 0, 11.801783959), x_dir=(0.9659258262890713, 0, 0.25881904510251014), z_dir=(0, 1, 0))) as fillet_2_piece_4_section:
        with BuildLine():
            CenterArc((FILLET_2_R * 0.414213562375, FILLET_2_R), FILLET_2_R, 225, 45)
            Line((-FILLET_2_R * 0.292893218812, FILLET_2_R * 0.292893218813), (0, 0))
            Line((0, 0), (FILLET_2_R * 0.414213562375, 0))
        make_face()
    fillet_2_piece_4 = extrude(amount=3, mode=Mode.PRIVATE)
    fillet_2_piece_4 = split(fillet_2_piece_4, bisect_by=Plane(origin=(64.006723661, 1.5, 12.264370105), z_dir=(-0.9659258262885981, 0, -0.2588190451042754)), keep=Keep.TOP, mode=Mode.PRIVATE)
    add(fillet_2_piece_4)
    with BuildSketch(Plane(origin=(19.722375735, 0, -57.763724736), x_dir=(0.49999999999999933, 0, 0.866025403784439), z_dir=(0, 1, 0))) as fillet_2_piece_5_section:
        with BuildLine():
            CenterArc((FILLET_2_R * 0.414213562373, FILLET_2_R), FILLET_2_R, 225, 45)
            Line((-FILLET_2_R * 0.292893218813, FILLET_2_R * 0.292893218813), (0, 0))
            Line((0, 0), (FILLET_2_R * 0.414213562373, 0))
        make_face()
    fillet_2_piece_5 = extrude(amount=3, mode=Mode.PRIVATE)
    fillet_2_piece_5 = split(fillet_2_piece_5, bisect_by=Plane(origin=(21.382105758, 1.5, -61.563633756), z_dir=(-0.2588190451024714, 0, 0.9659258262890816)), keep=Keep.TOP, mode=Mode.PRIVATE)
    add(fillet_2_piece_5)
    with BuildSketch(Plane(origin=(-19.722375735, 0, -57.763724736), x_dir=(-0.4999999999999984, 0, 0.8660254037844397), z_dir=(0, 1, 0))) as fillet_2_piece_6_section:
        with BuildLine():
            CenterArc((FILLET_2_R * 0.414213562373, -FILLET_2_R), FILLET_2_R, 90, 45)
            Line((-FILLET_2_R * 0.292893218813, -FILLET_2_R * 0.292893218813), (0, 0))
            Line((0, 0), (FILLET_2_R * 0.414213562373, 0))
        make_face()
    fillet_2_piece_6 = extrude(amount=3, mode=Mode.PRIVATE)
    fillet_2_piece_6 = split(fillet_2_piece_6, bisect_by=Plane(origin=(-21.382105758, 1.5, -61.563633756), z_dir=(0.25881904510246906, 0, 0.9659258262890822)), keep=Keep.TOP, mode=Mode.PRIVATE)
    add(fillet_2_piece_6)

    # 草圖11 → 填料-伸長7 (add)
    with BuildSketch(Plane(origin=(0, 3, 0), x_dir=(1, 0, 0), z_dir=(0, 1, 0))):
        with Locations(Location((0, 0, 0), (0, 0, 270))):
            Circle(SKETCH_11_R)
    extrude(amount=EXTRUDE_7_DEPTH)


solid = part.part
